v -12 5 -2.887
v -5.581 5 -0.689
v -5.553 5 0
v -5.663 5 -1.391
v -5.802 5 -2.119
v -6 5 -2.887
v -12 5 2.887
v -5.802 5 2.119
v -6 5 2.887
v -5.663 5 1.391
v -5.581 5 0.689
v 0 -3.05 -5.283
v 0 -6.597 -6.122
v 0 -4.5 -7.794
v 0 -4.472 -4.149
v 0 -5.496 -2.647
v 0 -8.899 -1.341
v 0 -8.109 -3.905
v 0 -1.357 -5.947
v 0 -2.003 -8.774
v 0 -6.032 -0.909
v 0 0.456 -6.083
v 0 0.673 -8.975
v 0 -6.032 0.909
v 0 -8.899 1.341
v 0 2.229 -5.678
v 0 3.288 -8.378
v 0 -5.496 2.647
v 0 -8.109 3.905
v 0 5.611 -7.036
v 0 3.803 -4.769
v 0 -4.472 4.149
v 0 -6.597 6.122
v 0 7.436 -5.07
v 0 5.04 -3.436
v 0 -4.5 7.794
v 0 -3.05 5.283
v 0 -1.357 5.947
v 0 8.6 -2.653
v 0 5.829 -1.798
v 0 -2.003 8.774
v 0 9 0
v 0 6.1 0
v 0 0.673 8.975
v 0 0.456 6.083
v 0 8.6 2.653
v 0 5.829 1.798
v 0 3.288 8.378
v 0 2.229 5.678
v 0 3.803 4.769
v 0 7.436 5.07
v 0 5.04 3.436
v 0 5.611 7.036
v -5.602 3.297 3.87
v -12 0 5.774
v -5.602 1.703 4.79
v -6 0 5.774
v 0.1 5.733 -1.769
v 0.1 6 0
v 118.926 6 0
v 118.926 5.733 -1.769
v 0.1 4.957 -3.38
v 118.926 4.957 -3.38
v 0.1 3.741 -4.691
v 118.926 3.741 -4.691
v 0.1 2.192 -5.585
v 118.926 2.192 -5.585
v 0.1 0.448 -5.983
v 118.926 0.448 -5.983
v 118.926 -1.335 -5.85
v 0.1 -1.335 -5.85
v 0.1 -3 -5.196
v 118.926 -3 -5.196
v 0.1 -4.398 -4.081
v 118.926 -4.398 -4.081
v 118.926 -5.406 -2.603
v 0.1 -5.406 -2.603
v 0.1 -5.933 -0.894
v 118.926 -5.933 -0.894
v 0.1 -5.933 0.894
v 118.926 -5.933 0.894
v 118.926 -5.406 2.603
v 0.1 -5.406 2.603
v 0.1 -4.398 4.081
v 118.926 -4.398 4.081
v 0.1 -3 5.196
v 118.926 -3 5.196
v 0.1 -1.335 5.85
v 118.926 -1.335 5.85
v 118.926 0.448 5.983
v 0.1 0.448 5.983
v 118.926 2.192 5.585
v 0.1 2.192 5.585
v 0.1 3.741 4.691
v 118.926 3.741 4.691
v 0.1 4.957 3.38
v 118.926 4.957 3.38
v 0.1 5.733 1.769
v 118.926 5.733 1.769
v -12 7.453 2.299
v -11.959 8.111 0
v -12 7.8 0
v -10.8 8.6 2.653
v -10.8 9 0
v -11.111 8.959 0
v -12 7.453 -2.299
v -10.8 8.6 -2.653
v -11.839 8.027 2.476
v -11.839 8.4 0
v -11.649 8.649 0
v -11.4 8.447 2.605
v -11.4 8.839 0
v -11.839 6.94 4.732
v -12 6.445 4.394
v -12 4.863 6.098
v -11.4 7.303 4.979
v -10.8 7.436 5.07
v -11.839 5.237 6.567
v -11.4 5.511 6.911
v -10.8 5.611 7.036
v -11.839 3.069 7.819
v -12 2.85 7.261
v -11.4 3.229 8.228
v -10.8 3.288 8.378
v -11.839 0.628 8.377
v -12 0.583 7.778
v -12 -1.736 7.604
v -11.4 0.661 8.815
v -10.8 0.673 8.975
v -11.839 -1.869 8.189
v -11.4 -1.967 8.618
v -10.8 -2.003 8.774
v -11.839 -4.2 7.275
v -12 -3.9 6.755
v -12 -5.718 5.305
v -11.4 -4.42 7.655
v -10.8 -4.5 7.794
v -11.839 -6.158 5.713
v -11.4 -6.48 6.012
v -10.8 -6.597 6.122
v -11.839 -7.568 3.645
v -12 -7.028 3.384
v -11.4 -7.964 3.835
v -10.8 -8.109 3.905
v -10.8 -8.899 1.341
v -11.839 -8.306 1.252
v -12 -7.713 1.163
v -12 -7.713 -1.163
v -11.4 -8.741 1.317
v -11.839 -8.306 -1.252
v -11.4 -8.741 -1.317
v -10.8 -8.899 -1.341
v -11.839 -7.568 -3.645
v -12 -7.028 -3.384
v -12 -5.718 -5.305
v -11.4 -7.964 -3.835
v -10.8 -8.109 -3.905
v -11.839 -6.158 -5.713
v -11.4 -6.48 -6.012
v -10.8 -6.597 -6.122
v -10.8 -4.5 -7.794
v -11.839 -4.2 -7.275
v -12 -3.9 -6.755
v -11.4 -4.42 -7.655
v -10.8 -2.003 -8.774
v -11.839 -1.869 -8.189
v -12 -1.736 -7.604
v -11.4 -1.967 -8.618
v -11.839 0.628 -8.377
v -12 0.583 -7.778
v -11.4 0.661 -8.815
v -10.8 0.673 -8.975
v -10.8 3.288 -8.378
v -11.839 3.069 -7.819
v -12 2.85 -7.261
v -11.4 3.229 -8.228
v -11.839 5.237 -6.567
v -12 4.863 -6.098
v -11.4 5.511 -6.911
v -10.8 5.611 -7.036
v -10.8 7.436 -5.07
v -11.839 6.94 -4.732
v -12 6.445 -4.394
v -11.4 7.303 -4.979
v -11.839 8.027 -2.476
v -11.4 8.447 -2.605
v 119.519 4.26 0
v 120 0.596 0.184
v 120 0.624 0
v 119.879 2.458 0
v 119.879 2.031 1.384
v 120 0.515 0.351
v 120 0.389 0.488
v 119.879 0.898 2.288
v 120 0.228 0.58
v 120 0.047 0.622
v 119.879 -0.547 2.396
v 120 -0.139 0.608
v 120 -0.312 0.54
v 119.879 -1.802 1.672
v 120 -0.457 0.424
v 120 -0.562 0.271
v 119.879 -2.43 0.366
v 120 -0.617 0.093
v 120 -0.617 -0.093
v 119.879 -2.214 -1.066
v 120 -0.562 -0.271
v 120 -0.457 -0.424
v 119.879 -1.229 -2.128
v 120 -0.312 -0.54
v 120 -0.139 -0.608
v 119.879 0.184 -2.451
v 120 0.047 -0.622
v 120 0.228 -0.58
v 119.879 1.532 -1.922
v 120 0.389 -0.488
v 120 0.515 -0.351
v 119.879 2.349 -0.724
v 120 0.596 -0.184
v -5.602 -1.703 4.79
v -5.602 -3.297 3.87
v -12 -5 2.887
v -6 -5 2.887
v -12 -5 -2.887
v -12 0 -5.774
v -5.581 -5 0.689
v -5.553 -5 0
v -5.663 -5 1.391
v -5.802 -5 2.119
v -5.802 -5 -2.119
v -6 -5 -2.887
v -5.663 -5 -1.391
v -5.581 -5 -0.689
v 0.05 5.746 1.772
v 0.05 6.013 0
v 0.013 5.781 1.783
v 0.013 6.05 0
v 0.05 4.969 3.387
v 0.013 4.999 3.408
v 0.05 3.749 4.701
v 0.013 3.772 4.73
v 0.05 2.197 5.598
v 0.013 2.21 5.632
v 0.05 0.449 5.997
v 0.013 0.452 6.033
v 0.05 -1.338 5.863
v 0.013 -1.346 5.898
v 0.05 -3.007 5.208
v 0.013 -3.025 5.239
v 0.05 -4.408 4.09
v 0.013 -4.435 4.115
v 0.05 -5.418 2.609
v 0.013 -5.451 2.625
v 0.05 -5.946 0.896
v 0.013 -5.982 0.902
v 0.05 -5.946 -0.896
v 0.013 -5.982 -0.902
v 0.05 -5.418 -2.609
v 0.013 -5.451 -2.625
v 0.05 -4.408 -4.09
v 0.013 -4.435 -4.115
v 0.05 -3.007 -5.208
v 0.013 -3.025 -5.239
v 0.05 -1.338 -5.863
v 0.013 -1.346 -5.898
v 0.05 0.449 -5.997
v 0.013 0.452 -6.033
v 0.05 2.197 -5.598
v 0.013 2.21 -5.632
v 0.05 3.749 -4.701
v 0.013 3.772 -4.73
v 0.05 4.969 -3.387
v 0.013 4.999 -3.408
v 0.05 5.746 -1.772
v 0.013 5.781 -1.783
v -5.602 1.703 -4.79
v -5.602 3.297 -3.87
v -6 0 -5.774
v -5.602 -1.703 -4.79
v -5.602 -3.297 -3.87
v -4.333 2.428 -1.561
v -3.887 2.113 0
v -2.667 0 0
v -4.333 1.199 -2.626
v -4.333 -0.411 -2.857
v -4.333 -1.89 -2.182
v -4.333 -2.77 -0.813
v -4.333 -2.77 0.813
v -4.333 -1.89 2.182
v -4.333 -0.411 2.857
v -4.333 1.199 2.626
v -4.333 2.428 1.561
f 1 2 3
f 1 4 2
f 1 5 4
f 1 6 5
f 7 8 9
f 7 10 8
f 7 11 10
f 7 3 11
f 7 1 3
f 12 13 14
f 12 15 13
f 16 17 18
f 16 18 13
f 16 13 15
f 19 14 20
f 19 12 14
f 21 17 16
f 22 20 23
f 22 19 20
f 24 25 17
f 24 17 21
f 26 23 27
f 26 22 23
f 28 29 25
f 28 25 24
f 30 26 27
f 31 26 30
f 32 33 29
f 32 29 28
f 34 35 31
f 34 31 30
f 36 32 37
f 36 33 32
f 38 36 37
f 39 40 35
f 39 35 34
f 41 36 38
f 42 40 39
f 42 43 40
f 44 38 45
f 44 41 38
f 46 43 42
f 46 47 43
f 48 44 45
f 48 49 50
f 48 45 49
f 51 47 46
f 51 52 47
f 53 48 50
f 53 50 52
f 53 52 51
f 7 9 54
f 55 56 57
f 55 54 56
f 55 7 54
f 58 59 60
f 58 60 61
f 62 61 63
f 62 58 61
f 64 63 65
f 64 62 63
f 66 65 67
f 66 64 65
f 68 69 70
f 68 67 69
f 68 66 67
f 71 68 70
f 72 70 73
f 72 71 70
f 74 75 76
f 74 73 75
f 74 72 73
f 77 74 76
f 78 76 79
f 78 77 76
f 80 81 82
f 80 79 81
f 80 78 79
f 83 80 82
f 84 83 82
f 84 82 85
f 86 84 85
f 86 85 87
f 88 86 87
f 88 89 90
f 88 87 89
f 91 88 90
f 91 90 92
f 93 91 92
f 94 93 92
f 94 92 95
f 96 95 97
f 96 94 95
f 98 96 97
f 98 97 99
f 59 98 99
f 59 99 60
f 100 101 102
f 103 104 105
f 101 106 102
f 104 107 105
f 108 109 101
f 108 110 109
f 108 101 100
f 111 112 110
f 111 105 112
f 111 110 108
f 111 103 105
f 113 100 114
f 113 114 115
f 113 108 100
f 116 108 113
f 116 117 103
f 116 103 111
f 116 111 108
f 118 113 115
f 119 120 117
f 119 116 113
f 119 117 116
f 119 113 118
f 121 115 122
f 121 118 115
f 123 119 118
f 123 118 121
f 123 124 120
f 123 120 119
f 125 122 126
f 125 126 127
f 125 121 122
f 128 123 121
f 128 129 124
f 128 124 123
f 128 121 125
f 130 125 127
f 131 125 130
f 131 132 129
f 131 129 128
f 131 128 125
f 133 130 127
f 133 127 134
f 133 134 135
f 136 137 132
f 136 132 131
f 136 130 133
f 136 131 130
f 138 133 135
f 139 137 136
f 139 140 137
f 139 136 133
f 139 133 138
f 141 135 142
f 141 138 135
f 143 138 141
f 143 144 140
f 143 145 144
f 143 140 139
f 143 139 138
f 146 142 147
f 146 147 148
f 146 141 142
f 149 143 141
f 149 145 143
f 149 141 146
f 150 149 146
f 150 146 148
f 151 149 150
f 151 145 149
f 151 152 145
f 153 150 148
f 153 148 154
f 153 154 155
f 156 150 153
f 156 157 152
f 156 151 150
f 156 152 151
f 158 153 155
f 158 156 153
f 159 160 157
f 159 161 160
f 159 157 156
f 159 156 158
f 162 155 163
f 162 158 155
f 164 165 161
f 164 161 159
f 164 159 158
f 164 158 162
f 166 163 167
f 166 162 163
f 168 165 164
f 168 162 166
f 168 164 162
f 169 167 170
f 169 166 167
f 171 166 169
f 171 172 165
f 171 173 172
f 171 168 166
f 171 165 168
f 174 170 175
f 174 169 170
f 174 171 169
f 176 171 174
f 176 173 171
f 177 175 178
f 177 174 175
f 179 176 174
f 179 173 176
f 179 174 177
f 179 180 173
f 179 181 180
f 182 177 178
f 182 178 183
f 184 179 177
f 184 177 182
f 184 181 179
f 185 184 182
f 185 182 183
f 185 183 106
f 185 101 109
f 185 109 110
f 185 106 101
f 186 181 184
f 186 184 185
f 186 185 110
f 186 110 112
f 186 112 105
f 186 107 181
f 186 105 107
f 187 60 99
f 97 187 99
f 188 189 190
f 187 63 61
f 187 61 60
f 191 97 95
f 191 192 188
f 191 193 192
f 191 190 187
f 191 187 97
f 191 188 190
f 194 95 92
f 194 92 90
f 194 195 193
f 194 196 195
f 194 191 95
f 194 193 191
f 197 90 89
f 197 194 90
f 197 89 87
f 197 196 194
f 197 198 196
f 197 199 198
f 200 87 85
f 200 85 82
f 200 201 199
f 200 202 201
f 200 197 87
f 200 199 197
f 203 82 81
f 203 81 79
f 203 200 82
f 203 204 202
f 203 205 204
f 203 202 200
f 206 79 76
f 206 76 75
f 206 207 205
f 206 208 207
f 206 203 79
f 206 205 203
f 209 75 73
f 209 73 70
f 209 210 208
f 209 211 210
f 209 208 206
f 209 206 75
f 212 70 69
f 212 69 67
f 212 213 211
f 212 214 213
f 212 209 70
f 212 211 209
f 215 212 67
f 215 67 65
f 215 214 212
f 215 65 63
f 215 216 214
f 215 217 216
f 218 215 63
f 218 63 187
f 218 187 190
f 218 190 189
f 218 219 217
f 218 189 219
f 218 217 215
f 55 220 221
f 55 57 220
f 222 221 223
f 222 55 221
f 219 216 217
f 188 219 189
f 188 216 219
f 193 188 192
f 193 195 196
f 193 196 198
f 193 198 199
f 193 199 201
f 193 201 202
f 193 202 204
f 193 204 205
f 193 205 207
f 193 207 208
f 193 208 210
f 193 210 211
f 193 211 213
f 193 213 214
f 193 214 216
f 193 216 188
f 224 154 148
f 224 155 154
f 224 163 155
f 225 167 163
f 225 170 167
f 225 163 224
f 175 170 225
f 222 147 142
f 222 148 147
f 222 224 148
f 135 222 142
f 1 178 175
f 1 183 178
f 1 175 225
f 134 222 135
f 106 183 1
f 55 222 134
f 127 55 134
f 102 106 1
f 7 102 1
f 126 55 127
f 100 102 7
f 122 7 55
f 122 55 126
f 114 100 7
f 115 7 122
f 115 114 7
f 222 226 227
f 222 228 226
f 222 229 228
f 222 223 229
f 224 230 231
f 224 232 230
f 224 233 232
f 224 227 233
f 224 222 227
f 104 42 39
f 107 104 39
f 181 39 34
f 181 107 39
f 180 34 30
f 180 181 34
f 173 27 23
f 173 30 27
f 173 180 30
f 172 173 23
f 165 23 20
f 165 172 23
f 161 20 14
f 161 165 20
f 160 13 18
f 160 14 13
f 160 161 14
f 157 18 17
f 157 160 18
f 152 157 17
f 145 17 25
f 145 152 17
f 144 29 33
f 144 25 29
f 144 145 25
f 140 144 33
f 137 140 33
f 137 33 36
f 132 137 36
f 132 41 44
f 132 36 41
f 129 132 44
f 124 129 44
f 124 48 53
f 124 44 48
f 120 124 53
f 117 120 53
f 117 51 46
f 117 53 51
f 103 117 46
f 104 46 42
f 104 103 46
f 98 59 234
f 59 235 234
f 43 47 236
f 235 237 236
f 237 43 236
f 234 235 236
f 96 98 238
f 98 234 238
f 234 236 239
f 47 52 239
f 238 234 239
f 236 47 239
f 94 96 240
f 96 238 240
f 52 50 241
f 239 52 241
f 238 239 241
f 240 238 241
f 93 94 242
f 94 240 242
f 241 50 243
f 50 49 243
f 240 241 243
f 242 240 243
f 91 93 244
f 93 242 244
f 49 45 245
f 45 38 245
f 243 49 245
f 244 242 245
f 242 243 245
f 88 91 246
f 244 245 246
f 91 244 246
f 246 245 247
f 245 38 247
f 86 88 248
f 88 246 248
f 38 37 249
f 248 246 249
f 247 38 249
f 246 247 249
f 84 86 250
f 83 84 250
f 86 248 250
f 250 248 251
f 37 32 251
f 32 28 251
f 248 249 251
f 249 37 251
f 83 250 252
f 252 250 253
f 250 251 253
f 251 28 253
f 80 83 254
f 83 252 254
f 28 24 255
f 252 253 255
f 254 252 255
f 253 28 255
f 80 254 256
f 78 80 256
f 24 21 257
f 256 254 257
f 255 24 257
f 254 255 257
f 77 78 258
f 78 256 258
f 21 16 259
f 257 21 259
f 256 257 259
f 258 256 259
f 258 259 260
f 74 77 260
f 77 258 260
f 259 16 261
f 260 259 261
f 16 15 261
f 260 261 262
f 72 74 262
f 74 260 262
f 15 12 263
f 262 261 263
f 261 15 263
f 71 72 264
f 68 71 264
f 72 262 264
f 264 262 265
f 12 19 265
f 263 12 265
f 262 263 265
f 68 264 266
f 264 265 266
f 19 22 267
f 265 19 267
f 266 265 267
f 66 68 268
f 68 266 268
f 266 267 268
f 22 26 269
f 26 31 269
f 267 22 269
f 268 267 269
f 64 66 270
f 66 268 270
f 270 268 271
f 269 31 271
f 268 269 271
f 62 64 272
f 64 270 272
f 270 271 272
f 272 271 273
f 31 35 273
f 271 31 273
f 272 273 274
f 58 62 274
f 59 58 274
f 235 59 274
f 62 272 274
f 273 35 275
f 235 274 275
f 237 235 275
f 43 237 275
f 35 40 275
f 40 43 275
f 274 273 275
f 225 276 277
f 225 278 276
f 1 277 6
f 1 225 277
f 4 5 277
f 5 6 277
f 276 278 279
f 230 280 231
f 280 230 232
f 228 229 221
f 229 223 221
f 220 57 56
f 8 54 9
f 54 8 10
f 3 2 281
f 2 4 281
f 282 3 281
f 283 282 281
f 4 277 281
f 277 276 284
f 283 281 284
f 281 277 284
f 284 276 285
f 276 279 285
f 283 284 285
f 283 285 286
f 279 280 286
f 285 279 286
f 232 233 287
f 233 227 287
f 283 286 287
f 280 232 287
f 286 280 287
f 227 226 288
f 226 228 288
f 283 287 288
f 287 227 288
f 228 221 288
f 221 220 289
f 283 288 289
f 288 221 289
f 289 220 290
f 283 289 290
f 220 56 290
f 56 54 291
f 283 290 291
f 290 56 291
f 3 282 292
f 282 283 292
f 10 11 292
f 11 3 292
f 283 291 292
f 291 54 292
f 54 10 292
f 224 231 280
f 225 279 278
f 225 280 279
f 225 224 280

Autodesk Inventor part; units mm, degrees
ref_plane "YZ Plane" through (0, 0, 0) normal (1, 0, 0) x (0, 1, 0)
ref_plane "XZ Plane" through (0, 0, 0) normal (0, 1, 0) x (-1, 0, 0)
sketch "Rascunho1" plane through (0, 0, 0) normal (0, 0, 1) x (1, 0, 0)
  line L0 (-2.6667, 0) -> (120, 0)
  line L1 (120, 0) -> (120, 6)
  line L2 (120, 6) -> (5, 6)
  line L3 (5, 6) -> (3.9264, 6)
  line L4 (3.9264, 6) -> (0, 6)
  line L5 (0, 6) -> (0, 9)
  line L6 (0, 9) -> (-12, 9)
  line L7 (-12, 9) -> (-12, 5.7735)
  line L8 (-12, 5.7735) -> (-6, 5.7735)
  line L9 (-6, 5.7735) -> (-2.6667, 0)
  line L10 (-38.4, 0) -> (146.4, 0) projected
  line L11 (0, -1.8) -> (0, 10.8) projected
  line L12 (5, 6) -> (0, 6) construction
  dimension "d1" = 115
  dimension "d2" = 1.0736
  dimension "d3" = 12
  dimension "d4" = 6
  dimension "d5" = 60
  dimension "d6" = 12
  dimension "d7" = 12
  dimension "d8" = 11.547
  dimension "d9" = 18
  dimension "d26" = 120
revolve "Corpo" add sketch "Rascunho1" angle 360 about axis through (-2.6667, 0, 0) along (1, 0, 0)
sketch "Rascunho2" plane through (-12, 0, 0) normal (-1, 0, 0) x (0, 0, 1)
  circle A0 centre (0, 0) radius 5.7735 projected
  line L0 (0, -12.6) -> (0, 12.6) projected
  line L1 (-12.6, 0) -> (12.6, 0) projected
  line L2 (5.7735, 0) -> (2.8868, -5)
  line L3 (2.8868, -5) -> (-2.8868, -5)
  line L4 (-2.8868, -5) -> (-5.7735, 0)
  line L5 (-5.7735, 0) -> (-2.8868, 5)
  line L6 (-2.8868, 5) -> (2.8868, 5)
  line L7 (2.8868, 5) -> (5.7735, 0)
extrude "Fenda" add sketch "Rascunho2" against normal up to next contours L7 A0 | A0 L2 | L6 L0 A0 | A0 L0 L3 | L0 L6 A0 | A0 L3 L0 | L4 A0 | A0 L5
fillet "Raio de arredondamento1" radius 1.2 1 edges at (-12, -9, 0)
thread "Rosca" size "M12x1.75" class "6g" standard "ANSI Metric M Profile" length 115
chamfer "Chanfrar1" distance 1.0735 distance2 1.0735 1 edges at (120, -6, 0) measured on face at (120, 1.668, 0.0818)
ref_plane "Work Plane1" through (29, 0, 0) normal (0, -1, 0) x (1, 0, 0)
fillet "Fillet2" radius 0.1 1 edges at (0, -6, 0)
fillet "Fillet3" radius 14 1 edges at (120, -4.9265, 0)
equation "\"d1\" = GEL"
equation "\"d3\" = KOH"
equation "\"d4\" = INTI"
equation "\"d6\" = GD"
equation "\"d7\" = BDM"
equation "\"d8\" = 1.1547 * SW"
equation "\"d9\" = KOD"
equation "\"d26\" = NLG"
equation "\"d17\" = RR"
equation "\"d13\" = GEL"
equation "\"d15\" = -0.5 * SPD + 0.5 * GD"
equation "\"d16\" = GUL"
equation "\"d30\" = R"
equation "\"GD\" = NND"
equation "\"NLG\" = 120"
equation "\"GEL\" = 115"
equation "\"KOD\" = 18"
equation "\"KOH\" = 12"
equation "\"INTI\" = 6"
equation "\"GAL\" = 0.61345 * PTC"
equation "\"GUL\" = 0.61345 * PTC"
equation "\"BDM\" = NND"
equation "\"RR\" = 1.2"
equation "\"SPD\" = NND - 1.2269 * PTC"
equation "\"R\" = 0.1"
equation "\"TOA\" = 30deg"
equation "\"GD1\" = THREADDIA - 1.2269 * PTC"
equation "\"THREADDIA\" = 12"
equation "\"FAWI\" = 45deg"
equation "\"ANG\" = 120deg"
equation "\"PTC\" = 1.75"
equation "\"NND\" = 12"
equation "\"E0\" = 1.155 * SW"
equation "\"SW\" = 10"
properties part number "DIN 912 - M12x120" material "Aço Inox AISI 304"
